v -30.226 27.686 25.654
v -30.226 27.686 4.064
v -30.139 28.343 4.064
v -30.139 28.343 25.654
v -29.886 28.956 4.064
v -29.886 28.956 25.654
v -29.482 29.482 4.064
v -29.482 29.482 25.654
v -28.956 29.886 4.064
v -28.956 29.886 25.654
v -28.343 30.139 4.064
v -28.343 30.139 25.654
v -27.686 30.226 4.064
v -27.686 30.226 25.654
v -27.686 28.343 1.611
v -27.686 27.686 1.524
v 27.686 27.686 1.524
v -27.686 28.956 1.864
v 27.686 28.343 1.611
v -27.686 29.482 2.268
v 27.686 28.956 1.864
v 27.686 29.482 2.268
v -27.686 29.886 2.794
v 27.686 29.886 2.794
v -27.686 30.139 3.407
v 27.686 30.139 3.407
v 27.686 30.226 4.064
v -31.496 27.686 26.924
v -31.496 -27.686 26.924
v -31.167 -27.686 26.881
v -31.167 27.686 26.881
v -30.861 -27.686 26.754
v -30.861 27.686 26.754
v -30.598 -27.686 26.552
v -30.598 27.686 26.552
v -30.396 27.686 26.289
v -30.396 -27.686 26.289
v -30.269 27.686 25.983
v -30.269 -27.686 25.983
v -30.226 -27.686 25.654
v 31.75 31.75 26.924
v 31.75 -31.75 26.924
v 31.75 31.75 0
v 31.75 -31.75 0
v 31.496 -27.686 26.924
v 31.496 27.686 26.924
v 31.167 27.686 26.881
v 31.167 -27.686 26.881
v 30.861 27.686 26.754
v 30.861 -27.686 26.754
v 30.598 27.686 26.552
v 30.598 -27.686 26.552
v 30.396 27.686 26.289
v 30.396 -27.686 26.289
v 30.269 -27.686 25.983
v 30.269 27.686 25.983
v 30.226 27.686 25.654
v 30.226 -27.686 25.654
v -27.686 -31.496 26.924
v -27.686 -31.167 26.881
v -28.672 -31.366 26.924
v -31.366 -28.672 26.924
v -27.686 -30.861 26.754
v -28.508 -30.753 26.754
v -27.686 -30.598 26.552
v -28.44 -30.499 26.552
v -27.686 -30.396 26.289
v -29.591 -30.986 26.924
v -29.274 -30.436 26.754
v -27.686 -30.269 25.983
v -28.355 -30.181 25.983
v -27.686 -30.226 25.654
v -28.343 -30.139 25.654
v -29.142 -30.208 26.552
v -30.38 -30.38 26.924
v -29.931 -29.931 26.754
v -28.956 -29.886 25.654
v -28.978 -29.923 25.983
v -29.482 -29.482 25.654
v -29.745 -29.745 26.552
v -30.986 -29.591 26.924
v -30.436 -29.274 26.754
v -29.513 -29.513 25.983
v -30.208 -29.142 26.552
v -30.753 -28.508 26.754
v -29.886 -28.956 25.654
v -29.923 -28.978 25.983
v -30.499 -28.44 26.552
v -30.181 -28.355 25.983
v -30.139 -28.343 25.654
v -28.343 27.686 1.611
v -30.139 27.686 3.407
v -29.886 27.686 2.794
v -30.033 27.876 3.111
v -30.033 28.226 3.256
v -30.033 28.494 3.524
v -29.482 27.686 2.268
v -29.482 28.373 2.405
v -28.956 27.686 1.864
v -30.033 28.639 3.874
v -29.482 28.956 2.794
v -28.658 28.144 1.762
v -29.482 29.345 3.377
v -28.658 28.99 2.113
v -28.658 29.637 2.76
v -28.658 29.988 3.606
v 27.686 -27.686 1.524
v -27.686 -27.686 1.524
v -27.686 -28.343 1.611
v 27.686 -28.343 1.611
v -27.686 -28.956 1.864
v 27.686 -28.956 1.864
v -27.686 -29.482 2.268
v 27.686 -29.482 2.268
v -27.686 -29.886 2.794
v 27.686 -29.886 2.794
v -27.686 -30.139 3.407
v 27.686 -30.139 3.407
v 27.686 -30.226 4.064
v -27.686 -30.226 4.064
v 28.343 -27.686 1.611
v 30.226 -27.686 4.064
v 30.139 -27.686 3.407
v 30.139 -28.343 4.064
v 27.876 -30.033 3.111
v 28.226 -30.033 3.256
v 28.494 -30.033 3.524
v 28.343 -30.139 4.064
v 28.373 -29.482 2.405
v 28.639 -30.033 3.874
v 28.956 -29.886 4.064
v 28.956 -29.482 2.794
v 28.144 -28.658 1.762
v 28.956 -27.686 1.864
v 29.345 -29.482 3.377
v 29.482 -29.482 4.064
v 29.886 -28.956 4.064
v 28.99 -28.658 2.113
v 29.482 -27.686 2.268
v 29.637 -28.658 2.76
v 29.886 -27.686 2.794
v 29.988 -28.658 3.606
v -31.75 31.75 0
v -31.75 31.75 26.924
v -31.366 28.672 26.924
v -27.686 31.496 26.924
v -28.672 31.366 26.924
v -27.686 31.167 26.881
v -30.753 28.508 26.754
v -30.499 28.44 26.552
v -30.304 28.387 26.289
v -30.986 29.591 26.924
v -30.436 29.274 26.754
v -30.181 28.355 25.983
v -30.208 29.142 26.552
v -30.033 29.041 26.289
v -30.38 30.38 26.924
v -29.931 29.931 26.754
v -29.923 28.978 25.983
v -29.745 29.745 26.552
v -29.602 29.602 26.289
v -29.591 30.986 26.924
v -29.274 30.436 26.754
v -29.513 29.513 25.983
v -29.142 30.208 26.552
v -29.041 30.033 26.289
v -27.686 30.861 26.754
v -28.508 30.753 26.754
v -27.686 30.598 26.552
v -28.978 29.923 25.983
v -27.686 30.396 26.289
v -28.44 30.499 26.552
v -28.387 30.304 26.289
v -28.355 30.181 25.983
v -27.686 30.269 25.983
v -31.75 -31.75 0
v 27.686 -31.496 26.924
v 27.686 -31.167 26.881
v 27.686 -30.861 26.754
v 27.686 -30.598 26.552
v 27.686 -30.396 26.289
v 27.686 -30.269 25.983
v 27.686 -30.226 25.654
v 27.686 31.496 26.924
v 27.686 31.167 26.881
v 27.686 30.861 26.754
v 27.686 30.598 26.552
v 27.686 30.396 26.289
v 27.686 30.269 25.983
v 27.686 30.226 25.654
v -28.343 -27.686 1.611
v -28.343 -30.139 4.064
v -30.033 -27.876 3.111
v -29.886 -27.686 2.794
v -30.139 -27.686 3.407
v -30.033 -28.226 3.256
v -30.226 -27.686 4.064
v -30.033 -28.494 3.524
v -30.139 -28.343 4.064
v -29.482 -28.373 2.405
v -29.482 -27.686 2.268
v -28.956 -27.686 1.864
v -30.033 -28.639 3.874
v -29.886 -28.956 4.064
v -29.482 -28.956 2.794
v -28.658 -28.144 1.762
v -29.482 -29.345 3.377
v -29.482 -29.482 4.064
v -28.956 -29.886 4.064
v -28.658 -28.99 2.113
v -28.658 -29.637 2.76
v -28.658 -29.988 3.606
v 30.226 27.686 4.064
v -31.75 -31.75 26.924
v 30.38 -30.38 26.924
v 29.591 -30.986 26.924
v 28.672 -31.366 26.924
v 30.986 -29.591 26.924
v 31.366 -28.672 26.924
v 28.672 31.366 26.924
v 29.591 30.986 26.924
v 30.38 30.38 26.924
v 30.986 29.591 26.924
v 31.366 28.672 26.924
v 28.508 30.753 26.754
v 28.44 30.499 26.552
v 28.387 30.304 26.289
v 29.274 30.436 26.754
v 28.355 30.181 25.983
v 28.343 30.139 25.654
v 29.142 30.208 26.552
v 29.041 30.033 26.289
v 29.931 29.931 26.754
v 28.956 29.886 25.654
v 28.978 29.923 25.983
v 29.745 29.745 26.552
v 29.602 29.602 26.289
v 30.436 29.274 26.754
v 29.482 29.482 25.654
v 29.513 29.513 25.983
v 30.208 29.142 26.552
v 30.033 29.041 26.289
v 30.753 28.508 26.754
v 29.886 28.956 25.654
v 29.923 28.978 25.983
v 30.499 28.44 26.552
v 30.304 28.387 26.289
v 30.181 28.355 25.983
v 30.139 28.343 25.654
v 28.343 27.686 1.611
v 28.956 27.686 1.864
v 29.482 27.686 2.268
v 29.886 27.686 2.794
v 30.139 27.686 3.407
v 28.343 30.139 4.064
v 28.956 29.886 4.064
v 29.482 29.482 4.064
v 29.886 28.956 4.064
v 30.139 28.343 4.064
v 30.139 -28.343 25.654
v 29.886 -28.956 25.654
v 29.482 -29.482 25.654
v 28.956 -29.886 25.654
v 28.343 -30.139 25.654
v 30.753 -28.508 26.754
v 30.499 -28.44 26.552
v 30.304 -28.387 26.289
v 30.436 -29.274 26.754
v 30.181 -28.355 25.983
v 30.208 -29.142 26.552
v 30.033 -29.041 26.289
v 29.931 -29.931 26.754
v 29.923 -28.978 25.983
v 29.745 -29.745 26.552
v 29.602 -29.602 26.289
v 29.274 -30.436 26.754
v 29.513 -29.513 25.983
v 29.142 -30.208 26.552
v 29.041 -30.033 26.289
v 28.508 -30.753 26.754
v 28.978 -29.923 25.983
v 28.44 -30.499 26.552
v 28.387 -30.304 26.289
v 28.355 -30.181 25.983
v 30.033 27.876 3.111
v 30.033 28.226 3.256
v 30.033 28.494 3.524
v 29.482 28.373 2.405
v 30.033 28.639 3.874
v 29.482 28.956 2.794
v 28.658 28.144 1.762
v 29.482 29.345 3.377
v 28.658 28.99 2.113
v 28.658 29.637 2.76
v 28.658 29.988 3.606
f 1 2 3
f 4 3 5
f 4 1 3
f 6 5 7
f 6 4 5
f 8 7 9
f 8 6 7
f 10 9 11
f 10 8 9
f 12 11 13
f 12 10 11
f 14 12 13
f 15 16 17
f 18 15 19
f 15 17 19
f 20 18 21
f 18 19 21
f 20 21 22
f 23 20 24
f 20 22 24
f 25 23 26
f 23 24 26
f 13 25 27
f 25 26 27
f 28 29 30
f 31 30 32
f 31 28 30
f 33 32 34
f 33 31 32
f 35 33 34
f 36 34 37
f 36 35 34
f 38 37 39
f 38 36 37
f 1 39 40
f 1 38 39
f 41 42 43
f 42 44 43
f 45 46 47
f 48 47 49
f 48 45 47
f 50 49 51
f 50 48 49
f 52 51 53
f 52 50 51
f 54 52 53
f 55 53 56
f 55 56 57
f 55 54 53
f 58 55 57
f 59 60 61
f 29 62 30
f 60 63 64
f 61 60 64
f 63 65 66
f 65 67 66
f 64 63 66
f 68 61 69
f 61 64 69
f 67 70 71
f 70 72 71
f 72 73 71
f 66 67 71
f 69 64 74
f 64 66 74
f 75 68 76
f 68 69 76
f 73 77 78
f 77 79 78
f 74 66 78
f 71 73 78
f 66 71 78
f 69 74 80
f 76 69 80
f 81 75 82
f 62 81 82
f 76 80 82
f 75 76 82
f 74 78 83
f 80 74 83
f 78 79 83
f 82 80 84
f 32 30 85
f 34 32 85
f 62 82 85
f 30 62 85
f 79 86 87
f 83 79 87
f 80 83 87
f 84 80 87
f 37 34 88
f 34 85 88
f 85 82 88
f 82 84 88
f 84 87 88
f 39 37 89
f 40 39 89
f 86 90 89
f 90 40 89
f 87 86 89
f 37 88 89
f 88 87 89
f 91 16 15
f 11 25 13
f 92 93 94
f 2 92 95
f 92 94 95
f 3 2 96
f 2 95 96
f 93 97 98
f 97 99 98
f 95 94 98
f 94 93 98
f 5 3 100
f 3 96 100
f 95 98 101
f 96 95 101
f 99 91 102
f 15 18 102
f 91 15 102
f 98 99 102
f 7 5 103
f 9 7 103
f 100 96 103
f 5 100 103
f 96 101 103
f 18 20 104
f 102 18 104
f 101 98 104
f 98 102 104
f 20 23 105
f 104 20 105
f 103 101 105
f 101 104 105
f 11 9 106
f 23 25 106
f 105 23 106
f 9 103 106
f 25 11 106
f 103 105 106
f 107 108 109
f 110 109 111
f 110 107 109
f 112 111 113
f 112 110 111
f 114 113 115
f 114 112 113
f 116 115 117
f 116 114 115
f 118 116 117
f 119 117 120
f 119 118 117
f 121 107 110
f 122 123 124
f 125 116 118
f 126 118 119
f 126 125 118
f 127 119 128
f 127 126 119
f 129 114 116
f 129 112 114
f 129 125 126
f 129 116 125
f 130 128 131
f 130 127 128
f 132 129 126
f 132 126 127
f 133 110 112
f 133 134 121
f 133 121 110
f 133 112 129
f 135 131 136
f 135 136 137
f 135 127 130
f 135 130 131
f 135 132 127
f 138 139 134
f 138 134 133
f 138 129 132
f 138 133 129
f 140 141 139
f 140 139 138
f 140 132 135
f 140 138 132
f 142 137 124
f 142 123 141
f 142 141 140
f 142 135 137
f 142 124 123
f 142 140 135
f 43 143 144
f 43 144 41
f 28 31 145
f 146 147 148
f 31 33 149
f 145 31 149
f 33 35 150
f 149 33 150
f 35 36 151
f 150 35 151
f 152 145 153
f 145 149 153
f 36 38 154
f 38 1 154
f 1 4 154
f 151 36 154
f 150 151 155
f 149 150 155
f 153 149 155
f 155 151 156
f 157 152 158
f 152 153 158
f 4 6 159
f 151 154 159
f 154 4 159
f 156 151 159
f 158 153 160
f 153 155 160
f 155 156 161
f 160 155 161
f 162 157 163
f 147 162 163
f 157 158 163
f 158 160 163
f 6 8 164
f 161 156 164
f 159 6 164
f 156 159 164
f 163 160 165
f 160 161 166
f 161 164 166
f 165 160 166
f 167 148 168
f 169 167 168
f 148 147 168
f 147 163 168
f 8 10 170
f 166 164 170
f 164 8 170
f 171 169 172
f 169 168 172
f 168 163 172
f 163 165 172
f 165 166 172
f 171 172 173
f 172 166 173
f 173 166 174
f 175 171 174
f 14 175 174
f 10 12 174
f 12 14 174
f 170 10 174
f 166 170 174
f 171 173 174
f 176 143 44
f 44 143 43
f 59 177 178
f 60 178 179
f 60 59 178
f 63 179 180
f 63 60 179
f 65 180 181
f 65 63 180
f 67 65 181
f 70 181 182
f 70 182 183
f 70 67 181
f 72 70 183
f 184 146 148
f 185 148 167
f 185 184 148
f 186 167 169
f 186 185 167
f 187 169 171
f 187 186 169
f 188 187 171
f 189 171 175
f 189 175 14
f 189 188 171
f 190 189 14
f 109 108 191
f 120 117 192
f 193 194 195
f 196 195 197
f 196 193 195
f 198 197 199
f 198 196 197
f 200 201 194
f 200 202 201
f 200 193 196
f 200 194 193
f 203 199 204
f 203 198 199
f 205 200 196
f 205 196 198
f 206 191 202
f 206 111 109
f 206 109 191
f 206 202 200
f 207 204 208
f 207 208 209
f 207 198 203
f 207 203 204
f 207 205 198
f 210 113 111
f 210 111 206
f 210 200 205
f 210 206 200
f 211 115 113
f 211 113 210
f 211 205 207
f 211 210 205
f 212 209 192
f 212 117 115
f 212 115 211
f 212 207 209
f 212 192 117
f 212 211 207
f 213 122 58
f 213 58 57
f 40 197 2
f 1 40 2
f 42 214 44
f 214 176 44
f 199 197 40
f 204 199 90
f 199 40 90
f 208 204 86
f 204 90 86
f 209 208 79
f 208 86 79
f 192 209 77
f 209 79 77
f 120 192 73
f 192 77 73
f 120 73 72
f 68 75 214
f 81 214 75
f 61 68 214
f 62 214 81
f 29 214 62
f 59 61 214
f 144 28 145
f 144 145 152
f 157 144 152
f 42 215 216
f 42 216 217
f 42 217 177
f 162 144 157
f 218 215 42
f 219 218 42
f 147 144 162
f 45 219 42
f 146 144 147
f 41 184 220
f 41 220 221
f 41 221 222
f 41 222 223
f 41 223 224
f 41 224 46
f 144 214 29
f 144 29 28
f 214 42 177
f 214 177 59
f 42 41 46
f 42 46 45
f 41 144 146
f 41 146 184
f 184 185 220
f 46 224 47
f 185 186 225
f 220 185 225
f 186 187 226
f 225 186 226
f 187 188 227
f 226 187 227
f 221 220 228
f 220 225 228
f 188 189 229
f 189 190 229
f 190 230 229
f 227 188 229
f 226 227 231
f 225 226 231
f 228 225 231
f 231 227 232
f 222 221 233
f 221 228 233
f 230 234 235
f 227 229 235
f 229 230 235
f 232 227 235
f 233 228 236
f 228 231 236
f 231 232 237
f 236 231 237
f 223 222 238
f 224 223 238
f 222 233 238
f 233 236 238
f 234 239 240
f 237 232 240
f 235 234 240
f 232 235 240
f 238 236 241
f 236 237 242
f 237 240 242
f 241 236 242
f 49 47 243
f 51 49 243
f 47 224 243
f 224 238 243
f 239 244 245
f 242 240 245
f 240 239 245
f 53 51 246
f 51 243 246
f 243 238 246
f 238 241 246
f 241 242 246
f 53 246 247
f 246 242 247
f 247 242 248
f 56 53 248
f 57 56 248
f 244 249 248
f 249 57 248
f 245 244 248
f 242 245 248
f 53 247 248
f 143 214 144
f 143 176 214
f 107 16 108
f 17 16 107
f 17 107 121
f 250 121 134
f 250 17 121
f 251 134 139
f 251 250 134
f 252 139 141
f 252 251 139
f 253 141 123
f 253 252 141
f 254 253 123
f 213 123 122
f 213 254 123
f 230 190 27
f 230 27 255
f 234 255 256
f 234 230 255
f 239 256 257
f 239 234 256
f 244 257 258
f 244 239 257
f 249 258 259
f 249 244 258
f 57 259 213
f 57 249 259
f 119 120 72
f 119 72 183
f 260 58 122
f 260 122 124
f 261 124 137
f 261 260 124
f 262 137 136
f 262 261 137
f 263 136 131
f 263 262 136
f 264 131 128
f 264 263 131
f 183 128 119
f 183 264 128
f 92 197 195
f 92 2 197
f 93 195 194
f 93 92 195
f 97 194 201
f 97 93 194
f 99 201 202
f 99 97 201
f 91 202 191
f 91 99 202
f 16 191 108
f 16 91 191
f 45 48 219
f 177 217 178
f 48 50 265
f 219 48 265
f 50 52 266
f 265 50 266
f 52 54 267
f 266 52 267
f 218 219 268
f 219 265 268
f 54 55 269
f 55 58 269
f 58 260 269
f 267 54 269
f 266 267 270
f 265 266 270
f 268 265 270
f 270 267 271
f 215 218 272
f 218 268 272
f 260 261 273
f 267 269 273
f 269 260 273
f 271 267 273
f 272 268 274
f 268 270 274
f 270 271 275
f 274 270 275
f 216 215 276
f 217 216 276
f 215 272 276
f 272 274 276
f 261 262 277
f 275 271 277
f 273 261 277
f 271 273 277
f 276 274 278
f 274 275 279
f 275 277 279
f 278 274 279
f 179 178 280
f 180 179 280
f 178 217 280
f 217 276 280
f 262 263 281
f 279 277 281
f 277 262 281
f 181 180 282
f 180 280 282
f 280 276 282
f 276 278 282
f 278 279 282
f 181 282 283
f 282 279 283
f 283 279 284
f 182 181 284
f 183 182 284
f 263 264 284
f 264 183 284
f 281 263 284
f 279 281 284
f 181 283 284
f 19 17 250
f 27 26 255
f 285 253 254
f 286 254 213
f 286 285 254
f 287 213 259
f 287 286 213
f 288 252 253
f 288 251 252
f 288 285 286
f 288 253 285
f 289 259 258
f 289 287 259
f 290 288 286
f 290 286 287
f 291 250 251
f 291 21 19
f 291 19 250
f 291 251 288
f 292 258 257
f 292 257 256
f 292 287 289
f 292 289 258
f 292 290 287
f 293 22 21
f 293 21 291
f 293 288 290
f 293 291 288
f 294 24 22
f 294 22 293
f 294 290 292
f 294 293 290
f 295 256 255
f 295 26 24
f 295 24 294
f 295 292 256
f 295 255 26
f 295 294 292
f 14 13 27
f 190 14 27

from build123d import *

# Parameters (mm, degrees)
F0_W     = 63.5
F0_H     = 63.5
F1_DEPTH = 1.524
F2_W     = 63.5
F2_H     = 63.5
F2_W_2   = 60.452
F2_H_2   = 60.452
F3_DEPTH = 25.4
F4_R     = 2.54
F5_R     = 1.27


with BuildPart() as f1:
    # F0 (on Top) → F1 (new body)
    with BuildSketch(Plane.XY):
        Rectangle(F0_W, F0_H)
    extrude(amount=F1_DEPTH)

    # F2 (on face) → F3 (join)
    with BuildSketch(Plane.XY.offset(1.524)):
        Rectangle(F2_W, F2_H)
        Rectangle(F2_W_2, F2_H_2, mode=Mode.SUBTRACT)
    extrude(amount=F3_DEPTH)

    # F4
    f4_edges = [f1.edges().sort_by_distance(p)[0] for p in [
        (0, 30.226, 1.524),
        (30.226, 0, 1.524),
        (0, -30.226, 1.524),
        (-30.226, 0, 1.524),
        (-30.226, 30.226, 14.224),
        (30.226, 30.226, 14.224),
        (30.226, -30.226, 14.224),
        (-30.226, -30.226, 14.224),
    ]]
    fillet(f4_edges, radius=F4_R)

    # F5
    f5_edges = [f1.edges().sort_by_distance(p)[0] for p in [
        (-30.226, 0, 26.924),
    ]]
    fillet(f5_edges, radius=F5_R)


solid = f1.part
